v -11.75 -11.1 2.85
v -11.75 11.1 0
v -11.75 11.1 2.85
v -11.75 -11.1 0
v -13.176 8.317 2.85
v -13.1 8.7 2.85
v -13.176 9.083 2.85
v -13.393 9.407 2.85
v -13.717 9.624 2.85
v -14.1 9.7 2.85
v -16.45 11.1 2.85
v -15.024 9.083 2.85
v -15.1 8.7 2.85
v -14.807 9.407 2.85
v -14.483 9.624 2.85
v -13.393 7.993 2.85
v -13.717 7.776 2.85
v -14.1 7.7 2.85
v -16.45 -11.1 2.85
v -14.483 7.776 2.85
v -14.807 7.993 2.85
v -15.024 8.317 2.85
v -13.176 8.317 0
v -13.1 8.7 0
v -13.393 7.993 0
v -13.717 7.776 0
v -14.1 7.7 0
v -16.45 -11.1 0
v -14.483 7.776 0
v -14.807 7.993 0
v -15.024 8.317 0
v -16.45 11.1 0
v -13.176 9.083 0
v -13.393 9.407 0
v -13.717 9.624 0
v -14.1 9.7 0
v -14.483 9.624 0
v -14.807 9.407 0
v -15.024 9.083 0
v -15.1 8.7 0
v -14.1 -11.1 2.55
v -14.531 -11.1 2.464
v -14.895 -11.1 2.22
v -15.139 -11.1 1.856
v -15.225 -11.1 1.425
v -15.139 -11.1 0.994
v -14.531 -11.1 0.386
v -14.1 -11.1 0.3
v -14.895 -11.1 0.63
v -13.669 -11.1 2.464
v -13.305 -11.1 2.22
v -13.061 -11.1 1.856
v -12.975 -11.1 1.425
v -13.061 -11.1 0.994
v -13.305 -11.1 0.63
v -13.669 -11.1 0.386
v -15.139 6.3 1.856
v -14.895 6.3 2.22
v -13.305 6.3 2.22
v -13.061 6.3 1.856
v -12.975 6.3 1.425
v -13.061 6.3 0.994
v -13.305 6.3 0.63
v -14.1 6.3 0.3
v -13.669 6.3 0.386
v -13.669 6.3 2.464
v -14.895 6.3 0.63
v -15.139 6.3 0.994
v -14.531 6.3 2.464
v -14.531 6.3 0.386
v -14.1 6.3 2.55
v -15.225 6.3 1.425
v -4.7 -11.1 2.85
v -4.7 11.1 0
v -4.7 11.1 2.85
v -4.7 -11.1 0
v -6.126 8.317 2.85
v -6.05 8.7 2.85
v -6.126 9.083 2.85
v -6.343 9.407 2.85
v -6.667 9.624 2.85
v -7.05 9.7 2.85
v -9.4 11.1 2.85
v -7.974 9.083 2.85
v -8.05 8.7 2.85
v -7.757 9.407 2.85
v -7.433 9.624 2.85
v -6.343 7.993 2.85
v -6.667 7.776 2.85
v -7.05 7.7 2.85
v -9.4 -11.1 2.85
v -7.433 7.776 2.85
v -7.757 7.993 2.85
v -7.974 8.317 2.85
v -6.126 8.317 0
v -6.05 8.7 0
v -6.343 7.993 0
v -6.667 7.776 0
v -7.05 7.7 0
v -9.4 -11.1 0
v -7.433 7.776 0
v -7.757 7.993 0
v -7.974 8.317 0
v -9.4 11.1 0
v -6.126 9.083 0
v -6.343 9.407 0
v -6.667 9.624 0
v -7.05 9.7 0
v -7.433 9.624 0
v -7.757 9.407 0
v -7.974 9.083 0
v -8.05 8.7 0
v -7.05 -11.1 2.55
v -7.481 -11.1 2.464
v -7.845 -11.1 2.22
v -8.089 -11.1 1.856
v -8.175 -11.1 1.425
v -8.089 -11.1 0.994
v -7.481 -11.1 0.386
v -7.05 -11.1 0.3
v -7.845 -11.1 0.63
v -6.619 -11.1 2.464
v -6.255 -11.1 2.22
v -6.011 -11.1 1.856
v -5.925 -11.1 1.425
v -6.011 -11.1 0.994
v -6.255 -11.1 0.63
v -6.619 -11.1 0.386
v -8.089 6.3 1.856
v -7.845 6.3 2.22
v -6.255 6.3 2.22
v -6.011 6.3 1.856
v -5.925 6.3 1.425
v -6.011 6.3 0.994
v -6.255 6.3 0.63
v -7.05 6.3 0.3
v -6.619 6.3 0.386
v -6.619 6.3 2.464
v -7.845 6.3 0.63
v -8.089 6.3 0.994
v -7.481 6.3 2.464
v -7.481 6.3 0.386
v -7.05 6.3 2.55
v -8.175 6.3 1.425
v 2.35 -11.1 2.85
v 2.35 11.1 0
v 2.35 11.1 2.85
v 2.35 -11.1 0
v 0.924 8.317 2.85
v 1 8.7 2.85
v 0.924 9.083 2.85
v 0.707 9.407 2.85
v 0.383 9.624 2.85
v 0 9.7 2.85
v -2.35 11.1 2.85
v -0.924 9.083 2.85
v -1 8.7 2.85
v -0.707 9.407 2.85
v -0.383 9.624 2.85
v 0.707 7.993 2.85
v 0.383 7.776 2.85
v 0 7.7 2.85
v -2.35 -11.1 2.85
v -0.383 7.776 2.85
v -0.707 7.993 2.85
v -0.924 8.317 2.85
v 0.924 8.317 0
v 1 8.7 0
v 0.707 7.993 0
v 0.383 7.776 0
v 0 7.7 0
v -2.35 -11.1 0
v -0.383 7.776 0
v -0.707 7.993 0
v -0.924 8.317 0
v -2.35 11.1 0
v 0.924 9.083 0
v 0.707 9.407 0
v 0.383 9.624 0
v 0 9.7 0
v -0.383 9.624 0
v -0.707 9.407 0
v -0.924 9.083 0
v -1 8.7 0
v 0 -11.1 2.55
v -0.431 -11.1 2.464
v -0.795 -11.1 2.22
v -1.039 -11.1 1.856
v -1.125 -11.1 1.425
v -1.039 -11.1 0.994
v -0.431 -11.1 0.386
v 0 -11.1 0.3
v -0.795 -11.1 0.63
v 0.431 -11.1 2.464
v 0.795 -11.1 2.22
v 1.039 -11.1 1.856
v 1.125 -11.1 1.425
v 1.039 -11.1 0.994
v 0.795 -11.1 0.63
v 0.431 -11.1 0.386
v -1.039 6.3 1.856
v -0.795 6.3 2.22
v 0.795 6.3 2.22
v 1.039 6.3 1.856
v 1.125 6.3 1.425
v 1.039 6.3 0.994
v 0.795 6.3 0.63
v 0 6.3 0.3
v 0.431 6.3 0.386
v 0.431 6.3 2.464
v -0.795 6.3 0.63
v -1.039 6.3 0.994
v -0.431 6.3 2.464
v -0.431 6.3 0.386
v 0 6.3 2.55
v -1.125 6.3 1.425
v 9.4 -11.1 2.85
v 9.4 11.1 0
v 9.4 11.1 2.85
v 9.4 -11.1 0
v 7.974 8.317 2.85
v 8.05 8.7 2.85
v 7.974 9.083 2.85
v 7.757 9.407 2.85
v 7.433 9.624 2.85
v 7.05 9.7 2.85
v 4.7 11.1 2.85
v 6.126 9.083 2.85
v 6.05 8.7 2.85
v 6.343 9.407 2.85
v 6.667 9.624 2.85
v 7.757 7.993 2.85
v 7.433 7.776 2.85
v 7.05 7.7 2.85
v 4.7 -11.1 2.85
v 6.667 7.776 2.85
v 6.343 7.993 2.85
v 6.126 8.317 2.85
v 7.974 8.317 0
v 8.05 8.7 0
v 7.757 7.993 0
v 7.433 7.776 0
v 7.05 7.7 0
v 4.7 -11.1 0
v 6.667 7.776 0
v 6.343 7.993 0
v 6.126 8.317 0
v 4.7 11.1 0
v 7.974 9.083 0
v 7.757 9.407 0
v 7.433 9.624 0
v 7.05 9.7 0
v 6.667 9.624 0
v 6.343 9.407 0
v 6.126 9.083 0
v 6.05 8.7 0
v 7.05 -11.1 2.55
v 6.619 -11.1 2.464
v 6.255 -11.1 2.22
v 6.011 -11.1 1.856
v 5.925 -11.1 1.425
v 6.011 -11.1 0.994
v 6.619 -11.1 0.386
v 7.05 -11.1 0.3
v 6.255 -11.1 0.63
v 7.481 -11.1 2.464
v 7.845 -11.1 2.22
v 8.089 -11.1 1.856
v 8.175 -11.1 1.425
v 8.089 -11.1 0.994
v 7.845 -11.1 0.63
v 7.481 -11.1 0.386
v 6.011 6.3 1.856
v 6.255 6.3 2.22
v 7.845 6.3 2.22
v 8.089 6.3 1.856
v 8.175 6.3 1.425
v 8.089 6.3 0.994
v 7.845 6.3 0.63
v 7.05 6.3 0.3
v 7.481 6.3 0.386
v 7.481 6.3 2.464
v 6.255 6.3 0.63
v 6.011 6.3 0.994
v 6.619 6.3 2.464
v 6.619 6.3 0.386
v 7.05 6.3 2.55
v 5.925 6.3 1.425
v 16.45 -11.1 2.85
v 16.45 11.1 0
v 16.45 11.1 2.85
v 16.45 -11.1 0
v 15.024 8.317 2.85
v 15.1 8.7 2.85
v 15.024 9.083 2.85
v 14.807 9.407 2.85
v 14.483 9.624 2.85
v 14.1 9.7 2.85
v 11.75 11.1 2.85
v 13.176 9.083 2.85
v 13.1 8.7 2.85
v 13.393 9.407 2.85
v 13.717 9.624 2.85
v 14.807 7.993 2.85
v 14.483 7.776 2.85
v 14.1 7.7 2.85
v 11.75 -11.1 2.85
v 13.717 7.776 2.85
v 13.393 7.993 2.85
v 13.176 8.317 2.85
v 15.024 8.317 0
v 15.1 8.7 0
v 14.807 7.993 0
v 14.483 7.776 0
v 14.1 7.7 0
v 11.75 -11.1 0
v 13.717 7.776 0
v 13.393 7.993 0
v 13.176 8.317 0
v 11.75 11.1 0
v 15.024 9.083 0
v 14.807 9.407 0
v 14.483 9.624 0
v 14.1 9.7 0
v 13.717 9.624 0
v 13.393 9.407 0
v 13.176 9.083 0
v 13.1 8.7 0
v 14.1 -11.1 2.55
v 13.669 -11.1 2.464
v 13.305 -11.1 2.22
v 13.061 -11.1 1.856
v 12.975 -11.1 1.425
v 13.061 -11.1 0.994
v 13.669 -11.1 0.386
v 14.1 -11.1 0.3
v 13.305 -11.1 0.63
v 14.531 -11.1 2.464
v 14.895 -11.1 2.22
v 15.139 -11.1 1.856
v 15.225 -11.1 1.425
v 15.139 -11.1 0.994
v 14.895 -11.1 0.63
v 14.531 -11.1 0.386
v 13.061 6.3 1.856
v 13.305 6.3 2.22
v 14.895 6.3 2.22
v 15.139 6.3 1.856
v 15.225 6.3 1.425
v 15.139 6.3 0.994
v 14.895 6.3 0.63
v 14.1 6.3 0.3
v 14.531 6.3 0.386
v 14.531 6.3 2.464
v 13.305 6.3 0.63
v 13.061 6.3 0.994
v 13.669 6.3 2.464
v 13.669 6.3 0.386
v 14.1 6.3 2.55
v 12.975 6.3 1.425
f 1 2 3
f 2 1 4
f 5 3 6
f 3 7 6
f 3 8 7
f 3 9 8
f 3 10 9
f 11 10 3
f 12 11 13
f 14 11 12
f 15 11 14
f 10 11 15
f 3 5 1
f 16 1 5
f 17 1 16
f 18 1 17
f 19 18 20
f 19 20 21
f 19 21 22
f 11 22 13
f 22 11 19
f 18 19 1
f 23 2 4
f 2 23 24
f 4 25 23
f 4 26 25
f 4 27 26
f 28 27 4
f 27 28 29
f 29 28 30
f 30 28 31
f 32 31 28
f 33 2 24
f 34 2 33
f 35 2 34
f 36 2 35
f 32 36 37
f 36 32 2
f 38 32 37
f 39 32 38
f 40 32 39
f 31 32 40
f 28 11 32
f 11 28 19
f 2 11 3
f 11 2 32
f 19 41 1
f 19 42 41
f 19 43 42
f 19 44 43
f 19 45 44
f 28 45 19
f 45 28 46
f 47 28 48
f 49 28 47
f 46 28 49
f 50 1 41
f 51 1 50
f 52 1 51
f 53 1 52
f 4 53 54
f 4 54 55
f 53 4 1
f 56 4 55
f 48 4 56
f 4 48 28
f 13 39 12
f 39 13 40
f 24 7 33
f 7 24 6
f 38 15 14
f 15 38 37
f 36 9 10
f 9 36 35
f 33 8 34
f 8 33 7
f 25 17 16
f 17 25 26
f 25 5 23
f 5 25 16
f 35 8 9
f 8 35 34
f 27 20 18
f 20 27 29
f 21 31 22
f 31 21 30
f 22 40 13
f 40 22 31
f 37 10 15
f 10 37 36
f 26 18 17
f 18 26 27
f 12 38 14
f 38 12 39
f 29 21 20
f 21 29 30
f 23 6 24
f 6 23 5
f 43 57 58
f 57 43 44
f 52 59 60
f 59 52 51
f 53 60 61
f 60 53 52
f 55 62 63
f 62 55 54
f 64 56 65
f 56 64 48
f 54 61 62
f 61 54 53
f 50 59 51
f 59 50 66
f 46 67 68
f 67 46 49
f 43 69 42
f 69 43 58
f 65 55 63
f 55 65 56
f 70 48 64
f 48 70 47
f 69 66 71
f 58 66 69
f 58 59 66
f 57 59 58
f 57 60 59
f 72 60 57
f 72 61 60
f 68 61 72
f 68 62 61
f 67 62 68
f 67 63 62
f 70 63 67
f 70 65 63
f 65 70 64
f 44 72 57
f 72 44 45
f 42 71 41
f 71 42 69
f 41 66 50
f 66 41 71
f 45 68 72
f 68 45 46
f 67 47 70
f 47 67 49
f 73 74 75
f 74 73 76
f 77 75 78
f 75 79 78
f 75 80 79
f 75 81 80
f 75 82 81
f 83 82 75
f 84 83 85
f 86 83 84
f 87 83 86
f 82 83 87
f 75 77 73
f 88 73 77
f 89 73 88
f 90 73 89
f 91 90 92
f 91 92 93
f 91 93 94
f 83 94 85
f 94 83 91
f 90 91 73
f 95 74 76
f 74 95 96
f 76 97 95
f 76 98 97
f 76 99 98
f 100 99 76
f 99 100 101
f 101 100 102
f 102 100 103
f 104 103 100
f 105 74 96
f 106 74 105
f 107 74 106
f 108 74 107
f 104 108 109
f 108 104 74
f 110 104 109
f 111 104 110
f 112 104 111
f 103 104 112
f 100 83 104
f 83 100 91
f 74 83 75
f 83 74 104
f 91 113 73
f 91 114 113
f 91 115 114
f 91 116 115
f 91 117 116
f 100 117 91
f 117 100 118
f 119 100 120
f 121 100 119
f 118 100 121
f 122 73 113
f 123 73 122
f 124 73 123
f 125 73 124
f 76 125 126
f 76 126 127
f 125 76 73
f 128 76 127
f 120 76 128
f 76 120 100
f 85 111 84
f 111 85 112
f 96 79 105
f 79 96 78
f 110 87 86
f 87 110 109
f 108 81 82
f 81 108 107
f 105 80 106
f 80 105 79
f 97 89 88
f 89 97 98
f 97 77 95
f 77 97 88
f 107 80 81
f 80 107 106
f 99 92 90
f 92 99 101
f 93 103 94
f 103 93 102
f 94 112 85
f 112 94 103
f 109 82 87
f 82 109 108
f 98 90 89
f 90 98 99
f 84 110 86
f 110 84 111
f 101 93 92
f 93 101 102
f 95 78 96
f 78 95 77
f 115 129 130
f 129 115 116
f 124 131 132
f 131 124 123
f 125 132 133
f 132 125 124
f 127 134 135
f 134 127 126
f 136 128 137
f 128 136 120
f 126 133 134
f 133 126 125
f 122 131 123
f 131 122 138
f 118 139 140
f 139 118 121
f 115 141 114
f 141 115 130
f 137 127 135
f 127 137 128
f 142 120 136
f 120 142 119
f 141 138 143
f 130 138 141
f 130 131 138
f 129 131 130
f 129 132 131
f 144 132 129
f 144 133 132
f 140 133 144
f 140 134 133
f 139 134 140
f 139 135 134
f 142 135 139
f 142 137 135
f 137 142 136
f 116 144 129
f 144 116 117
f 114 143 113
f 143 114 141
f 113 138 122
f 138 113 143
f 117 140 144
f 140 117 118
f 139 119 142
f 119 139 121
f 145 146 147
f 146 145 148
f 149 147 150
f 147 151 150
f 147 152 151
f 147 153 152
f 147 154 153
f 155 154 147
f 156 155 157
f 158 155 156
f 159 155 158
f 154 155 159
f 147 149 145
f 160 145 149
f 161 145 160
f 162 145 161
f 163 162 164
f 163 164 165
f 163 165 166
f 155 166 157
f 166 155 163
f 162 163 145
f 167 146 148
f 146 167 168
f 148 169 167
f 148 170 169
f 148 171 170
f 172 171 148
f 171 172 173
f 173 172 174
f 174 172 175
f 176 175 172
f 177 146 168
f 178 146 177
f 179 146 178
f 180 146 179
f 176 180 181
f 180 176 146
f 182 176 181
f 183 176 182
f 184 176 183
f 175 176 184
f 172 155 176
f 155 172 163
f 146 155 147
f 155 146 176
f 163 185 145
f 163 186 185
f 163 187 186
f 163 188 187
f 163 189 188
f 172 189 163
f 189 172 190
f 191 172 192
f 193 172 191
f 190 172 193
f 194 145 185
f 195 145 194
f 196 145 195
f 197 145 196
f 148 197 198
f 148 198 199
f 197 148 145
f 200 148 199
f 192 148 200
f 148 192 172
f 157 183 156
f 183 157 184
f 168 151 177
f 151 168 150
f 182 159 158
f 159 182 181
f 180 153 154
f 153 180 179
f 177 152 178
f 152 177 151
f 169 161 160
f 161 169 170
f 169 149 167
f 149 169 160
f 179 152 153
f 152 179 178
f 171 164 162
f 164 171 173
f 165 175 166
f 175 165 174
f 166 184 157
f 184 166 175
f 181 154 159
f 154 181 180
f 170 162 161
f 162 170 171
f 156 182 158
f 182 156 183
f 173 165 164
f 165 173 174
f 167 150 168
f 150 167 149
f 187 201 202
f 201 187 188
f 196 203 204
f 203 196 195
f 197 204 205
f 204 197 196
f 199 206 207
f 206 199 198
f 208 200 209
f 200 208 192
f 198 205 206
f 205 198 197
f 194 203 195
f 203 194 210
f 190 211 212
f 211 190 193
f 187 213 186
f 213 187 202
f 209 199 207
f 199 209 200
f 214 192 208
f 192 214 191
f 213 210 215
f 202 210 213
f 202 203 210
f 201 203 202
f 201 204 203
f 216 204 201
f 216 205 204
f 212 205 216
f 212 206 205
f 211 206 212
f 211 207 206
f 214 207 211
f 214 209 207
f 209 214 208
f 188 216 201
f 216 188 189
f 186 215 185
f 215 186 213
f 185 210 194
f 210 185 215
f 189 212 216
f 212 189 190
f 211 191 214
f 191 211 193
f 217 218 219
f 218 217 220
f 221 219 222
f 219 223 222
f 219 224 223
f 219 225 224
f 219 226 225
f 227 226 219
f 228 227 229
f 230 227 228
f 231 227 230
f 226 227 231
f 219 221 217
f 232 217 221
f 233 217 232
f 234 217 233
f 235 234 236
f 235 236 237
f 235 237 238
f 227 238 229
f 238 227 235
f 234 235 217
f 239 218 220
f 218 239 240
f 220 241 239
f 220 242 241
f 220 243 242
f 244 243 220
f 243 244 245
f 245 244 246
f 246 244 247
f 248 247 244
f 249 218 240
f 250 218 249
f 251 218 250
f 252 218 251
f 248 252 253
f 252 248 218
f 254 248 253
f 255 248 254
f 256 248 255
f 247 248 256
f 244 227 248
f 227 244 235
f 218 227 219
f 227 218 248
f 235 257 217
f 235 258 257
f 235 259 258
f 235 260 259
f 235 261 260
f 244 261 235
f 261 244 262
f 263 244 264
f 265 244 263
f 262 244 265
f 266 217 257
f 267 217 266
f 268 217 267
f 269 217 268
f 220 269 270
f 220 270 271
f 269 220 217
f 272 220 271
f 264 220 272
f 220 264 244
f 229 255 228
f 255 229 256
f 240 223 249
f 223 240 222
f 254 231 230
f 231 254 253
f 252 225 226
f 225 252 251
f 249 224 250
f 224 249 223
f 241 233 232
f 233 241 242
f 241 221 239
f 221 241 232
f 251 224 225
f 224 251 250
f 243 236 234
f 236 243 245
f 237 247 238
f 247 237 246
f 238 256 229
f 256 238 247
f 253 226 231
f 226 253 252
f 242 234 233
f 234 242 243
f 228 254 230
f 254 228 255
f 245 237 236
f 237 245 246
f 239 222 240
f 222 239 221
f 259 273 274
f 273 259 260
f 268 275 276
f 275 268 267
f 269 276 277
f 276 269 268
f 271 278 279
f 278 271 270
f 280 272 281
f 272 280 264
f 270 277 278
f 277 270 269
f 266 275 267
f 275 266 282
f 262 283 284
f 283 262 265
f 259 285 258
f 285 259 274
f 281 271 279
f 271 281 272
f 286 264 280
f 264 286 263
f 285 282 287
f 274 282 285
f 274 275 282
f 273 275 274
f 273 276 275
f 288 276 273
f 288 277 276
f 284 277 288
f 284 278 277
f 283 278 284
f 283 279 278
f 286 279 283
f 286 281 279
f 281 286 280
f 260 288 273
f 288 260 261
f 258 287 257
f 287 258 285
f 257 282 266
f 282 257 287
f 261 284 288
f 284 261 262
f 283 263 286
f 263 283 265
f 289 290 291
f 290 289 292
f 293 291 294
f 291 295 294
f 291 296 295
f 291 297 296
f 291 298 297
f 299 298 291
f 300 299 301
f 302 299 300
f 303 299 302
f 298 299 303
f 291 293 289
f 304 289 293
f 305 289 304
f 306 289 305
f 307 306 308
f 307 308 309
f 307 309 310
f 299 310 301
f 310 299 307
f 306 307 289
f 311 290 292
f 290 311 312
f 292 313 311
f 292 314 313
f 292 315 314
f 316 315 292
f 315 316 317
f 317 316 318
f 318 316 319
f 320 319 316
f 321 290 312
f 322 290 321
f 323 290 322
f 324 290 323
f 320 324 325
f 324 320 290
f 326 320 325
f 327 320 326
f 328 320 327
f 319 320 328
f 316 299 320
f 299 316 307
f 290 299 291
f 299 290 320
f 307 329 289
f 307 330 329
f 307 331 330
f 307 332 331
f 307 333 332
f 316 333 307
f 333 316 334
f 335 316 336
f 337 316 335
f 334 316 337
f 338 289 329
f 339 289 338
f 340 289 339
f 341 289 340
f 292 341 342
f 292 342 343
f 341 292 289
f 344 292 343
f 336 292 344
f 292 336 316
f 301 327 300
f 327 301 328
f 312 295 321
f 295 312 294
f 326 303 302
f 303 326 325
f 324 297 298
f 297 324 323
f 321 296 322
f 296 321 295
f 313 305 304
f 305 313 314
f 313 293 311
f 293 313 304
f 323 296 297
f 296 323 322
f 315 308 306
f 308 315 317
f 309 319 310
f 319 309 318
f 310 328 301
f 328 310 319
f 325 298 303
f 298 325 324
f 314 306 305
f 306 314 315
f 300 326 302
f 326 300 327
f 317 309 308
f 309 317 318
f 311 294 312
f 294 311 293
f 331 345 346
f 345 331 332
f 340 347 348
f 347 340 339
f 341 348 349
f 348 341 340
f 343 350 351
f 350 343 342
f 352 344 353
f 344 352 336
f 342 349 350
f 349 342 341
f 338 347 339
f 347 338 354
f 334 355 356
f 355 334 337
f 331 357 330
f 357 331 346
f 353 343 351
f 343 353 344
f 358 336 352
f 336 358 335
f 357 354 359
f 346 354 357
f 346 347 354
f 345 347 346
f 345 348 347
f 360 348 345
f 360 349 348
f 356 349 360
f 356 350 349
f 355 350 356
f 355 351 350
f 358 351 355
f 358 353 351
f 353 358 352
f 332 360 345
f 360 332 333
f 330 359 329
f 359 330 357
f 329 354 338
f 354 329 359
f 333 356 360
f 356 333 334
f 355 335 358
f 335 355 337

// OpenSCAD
// Generate tensioner blocks. for e-NABLE Hand 2.0.

// reference a few related objects from the EH2.0 to check fit:

//import("/Users/laird/src/e-NABLE-Assembler/EH2.0/EH2.0_Tensioner [x1].stl");

//%difference() {
//	import("/Users/laird/src/e-NABLE-Assembler/EH2.0/Hexpins_2.6.stl");
//	}

x=4.7;
y=22.2;
z=2.85;
d=2;
o=2.4;
screwD = 2.4;
	
tensioners(2.25);

module tensioners(screwD=2.4) {
	assign(spacing=1.5*x) {
	echo(screwD, spacing);
	for (x2 = [-2*spacing:spacing:2*spacing]) translate([x2,0,0]) tensionerPin(screwD);
	}
}

module tensionerPin(screwD=2.4) {
	difference() {
		translate([0,0,z/2]) cube([x,y,z], center=true);
		translate([0,y/2-o,-1]) cylinder(d=d,h=20, $fn=16);
		translate([0,y/2-2*o,z/2]) rotate([90,0,0]) cylinder(d=screwD,h=20, $fn=16);
	}
	}
